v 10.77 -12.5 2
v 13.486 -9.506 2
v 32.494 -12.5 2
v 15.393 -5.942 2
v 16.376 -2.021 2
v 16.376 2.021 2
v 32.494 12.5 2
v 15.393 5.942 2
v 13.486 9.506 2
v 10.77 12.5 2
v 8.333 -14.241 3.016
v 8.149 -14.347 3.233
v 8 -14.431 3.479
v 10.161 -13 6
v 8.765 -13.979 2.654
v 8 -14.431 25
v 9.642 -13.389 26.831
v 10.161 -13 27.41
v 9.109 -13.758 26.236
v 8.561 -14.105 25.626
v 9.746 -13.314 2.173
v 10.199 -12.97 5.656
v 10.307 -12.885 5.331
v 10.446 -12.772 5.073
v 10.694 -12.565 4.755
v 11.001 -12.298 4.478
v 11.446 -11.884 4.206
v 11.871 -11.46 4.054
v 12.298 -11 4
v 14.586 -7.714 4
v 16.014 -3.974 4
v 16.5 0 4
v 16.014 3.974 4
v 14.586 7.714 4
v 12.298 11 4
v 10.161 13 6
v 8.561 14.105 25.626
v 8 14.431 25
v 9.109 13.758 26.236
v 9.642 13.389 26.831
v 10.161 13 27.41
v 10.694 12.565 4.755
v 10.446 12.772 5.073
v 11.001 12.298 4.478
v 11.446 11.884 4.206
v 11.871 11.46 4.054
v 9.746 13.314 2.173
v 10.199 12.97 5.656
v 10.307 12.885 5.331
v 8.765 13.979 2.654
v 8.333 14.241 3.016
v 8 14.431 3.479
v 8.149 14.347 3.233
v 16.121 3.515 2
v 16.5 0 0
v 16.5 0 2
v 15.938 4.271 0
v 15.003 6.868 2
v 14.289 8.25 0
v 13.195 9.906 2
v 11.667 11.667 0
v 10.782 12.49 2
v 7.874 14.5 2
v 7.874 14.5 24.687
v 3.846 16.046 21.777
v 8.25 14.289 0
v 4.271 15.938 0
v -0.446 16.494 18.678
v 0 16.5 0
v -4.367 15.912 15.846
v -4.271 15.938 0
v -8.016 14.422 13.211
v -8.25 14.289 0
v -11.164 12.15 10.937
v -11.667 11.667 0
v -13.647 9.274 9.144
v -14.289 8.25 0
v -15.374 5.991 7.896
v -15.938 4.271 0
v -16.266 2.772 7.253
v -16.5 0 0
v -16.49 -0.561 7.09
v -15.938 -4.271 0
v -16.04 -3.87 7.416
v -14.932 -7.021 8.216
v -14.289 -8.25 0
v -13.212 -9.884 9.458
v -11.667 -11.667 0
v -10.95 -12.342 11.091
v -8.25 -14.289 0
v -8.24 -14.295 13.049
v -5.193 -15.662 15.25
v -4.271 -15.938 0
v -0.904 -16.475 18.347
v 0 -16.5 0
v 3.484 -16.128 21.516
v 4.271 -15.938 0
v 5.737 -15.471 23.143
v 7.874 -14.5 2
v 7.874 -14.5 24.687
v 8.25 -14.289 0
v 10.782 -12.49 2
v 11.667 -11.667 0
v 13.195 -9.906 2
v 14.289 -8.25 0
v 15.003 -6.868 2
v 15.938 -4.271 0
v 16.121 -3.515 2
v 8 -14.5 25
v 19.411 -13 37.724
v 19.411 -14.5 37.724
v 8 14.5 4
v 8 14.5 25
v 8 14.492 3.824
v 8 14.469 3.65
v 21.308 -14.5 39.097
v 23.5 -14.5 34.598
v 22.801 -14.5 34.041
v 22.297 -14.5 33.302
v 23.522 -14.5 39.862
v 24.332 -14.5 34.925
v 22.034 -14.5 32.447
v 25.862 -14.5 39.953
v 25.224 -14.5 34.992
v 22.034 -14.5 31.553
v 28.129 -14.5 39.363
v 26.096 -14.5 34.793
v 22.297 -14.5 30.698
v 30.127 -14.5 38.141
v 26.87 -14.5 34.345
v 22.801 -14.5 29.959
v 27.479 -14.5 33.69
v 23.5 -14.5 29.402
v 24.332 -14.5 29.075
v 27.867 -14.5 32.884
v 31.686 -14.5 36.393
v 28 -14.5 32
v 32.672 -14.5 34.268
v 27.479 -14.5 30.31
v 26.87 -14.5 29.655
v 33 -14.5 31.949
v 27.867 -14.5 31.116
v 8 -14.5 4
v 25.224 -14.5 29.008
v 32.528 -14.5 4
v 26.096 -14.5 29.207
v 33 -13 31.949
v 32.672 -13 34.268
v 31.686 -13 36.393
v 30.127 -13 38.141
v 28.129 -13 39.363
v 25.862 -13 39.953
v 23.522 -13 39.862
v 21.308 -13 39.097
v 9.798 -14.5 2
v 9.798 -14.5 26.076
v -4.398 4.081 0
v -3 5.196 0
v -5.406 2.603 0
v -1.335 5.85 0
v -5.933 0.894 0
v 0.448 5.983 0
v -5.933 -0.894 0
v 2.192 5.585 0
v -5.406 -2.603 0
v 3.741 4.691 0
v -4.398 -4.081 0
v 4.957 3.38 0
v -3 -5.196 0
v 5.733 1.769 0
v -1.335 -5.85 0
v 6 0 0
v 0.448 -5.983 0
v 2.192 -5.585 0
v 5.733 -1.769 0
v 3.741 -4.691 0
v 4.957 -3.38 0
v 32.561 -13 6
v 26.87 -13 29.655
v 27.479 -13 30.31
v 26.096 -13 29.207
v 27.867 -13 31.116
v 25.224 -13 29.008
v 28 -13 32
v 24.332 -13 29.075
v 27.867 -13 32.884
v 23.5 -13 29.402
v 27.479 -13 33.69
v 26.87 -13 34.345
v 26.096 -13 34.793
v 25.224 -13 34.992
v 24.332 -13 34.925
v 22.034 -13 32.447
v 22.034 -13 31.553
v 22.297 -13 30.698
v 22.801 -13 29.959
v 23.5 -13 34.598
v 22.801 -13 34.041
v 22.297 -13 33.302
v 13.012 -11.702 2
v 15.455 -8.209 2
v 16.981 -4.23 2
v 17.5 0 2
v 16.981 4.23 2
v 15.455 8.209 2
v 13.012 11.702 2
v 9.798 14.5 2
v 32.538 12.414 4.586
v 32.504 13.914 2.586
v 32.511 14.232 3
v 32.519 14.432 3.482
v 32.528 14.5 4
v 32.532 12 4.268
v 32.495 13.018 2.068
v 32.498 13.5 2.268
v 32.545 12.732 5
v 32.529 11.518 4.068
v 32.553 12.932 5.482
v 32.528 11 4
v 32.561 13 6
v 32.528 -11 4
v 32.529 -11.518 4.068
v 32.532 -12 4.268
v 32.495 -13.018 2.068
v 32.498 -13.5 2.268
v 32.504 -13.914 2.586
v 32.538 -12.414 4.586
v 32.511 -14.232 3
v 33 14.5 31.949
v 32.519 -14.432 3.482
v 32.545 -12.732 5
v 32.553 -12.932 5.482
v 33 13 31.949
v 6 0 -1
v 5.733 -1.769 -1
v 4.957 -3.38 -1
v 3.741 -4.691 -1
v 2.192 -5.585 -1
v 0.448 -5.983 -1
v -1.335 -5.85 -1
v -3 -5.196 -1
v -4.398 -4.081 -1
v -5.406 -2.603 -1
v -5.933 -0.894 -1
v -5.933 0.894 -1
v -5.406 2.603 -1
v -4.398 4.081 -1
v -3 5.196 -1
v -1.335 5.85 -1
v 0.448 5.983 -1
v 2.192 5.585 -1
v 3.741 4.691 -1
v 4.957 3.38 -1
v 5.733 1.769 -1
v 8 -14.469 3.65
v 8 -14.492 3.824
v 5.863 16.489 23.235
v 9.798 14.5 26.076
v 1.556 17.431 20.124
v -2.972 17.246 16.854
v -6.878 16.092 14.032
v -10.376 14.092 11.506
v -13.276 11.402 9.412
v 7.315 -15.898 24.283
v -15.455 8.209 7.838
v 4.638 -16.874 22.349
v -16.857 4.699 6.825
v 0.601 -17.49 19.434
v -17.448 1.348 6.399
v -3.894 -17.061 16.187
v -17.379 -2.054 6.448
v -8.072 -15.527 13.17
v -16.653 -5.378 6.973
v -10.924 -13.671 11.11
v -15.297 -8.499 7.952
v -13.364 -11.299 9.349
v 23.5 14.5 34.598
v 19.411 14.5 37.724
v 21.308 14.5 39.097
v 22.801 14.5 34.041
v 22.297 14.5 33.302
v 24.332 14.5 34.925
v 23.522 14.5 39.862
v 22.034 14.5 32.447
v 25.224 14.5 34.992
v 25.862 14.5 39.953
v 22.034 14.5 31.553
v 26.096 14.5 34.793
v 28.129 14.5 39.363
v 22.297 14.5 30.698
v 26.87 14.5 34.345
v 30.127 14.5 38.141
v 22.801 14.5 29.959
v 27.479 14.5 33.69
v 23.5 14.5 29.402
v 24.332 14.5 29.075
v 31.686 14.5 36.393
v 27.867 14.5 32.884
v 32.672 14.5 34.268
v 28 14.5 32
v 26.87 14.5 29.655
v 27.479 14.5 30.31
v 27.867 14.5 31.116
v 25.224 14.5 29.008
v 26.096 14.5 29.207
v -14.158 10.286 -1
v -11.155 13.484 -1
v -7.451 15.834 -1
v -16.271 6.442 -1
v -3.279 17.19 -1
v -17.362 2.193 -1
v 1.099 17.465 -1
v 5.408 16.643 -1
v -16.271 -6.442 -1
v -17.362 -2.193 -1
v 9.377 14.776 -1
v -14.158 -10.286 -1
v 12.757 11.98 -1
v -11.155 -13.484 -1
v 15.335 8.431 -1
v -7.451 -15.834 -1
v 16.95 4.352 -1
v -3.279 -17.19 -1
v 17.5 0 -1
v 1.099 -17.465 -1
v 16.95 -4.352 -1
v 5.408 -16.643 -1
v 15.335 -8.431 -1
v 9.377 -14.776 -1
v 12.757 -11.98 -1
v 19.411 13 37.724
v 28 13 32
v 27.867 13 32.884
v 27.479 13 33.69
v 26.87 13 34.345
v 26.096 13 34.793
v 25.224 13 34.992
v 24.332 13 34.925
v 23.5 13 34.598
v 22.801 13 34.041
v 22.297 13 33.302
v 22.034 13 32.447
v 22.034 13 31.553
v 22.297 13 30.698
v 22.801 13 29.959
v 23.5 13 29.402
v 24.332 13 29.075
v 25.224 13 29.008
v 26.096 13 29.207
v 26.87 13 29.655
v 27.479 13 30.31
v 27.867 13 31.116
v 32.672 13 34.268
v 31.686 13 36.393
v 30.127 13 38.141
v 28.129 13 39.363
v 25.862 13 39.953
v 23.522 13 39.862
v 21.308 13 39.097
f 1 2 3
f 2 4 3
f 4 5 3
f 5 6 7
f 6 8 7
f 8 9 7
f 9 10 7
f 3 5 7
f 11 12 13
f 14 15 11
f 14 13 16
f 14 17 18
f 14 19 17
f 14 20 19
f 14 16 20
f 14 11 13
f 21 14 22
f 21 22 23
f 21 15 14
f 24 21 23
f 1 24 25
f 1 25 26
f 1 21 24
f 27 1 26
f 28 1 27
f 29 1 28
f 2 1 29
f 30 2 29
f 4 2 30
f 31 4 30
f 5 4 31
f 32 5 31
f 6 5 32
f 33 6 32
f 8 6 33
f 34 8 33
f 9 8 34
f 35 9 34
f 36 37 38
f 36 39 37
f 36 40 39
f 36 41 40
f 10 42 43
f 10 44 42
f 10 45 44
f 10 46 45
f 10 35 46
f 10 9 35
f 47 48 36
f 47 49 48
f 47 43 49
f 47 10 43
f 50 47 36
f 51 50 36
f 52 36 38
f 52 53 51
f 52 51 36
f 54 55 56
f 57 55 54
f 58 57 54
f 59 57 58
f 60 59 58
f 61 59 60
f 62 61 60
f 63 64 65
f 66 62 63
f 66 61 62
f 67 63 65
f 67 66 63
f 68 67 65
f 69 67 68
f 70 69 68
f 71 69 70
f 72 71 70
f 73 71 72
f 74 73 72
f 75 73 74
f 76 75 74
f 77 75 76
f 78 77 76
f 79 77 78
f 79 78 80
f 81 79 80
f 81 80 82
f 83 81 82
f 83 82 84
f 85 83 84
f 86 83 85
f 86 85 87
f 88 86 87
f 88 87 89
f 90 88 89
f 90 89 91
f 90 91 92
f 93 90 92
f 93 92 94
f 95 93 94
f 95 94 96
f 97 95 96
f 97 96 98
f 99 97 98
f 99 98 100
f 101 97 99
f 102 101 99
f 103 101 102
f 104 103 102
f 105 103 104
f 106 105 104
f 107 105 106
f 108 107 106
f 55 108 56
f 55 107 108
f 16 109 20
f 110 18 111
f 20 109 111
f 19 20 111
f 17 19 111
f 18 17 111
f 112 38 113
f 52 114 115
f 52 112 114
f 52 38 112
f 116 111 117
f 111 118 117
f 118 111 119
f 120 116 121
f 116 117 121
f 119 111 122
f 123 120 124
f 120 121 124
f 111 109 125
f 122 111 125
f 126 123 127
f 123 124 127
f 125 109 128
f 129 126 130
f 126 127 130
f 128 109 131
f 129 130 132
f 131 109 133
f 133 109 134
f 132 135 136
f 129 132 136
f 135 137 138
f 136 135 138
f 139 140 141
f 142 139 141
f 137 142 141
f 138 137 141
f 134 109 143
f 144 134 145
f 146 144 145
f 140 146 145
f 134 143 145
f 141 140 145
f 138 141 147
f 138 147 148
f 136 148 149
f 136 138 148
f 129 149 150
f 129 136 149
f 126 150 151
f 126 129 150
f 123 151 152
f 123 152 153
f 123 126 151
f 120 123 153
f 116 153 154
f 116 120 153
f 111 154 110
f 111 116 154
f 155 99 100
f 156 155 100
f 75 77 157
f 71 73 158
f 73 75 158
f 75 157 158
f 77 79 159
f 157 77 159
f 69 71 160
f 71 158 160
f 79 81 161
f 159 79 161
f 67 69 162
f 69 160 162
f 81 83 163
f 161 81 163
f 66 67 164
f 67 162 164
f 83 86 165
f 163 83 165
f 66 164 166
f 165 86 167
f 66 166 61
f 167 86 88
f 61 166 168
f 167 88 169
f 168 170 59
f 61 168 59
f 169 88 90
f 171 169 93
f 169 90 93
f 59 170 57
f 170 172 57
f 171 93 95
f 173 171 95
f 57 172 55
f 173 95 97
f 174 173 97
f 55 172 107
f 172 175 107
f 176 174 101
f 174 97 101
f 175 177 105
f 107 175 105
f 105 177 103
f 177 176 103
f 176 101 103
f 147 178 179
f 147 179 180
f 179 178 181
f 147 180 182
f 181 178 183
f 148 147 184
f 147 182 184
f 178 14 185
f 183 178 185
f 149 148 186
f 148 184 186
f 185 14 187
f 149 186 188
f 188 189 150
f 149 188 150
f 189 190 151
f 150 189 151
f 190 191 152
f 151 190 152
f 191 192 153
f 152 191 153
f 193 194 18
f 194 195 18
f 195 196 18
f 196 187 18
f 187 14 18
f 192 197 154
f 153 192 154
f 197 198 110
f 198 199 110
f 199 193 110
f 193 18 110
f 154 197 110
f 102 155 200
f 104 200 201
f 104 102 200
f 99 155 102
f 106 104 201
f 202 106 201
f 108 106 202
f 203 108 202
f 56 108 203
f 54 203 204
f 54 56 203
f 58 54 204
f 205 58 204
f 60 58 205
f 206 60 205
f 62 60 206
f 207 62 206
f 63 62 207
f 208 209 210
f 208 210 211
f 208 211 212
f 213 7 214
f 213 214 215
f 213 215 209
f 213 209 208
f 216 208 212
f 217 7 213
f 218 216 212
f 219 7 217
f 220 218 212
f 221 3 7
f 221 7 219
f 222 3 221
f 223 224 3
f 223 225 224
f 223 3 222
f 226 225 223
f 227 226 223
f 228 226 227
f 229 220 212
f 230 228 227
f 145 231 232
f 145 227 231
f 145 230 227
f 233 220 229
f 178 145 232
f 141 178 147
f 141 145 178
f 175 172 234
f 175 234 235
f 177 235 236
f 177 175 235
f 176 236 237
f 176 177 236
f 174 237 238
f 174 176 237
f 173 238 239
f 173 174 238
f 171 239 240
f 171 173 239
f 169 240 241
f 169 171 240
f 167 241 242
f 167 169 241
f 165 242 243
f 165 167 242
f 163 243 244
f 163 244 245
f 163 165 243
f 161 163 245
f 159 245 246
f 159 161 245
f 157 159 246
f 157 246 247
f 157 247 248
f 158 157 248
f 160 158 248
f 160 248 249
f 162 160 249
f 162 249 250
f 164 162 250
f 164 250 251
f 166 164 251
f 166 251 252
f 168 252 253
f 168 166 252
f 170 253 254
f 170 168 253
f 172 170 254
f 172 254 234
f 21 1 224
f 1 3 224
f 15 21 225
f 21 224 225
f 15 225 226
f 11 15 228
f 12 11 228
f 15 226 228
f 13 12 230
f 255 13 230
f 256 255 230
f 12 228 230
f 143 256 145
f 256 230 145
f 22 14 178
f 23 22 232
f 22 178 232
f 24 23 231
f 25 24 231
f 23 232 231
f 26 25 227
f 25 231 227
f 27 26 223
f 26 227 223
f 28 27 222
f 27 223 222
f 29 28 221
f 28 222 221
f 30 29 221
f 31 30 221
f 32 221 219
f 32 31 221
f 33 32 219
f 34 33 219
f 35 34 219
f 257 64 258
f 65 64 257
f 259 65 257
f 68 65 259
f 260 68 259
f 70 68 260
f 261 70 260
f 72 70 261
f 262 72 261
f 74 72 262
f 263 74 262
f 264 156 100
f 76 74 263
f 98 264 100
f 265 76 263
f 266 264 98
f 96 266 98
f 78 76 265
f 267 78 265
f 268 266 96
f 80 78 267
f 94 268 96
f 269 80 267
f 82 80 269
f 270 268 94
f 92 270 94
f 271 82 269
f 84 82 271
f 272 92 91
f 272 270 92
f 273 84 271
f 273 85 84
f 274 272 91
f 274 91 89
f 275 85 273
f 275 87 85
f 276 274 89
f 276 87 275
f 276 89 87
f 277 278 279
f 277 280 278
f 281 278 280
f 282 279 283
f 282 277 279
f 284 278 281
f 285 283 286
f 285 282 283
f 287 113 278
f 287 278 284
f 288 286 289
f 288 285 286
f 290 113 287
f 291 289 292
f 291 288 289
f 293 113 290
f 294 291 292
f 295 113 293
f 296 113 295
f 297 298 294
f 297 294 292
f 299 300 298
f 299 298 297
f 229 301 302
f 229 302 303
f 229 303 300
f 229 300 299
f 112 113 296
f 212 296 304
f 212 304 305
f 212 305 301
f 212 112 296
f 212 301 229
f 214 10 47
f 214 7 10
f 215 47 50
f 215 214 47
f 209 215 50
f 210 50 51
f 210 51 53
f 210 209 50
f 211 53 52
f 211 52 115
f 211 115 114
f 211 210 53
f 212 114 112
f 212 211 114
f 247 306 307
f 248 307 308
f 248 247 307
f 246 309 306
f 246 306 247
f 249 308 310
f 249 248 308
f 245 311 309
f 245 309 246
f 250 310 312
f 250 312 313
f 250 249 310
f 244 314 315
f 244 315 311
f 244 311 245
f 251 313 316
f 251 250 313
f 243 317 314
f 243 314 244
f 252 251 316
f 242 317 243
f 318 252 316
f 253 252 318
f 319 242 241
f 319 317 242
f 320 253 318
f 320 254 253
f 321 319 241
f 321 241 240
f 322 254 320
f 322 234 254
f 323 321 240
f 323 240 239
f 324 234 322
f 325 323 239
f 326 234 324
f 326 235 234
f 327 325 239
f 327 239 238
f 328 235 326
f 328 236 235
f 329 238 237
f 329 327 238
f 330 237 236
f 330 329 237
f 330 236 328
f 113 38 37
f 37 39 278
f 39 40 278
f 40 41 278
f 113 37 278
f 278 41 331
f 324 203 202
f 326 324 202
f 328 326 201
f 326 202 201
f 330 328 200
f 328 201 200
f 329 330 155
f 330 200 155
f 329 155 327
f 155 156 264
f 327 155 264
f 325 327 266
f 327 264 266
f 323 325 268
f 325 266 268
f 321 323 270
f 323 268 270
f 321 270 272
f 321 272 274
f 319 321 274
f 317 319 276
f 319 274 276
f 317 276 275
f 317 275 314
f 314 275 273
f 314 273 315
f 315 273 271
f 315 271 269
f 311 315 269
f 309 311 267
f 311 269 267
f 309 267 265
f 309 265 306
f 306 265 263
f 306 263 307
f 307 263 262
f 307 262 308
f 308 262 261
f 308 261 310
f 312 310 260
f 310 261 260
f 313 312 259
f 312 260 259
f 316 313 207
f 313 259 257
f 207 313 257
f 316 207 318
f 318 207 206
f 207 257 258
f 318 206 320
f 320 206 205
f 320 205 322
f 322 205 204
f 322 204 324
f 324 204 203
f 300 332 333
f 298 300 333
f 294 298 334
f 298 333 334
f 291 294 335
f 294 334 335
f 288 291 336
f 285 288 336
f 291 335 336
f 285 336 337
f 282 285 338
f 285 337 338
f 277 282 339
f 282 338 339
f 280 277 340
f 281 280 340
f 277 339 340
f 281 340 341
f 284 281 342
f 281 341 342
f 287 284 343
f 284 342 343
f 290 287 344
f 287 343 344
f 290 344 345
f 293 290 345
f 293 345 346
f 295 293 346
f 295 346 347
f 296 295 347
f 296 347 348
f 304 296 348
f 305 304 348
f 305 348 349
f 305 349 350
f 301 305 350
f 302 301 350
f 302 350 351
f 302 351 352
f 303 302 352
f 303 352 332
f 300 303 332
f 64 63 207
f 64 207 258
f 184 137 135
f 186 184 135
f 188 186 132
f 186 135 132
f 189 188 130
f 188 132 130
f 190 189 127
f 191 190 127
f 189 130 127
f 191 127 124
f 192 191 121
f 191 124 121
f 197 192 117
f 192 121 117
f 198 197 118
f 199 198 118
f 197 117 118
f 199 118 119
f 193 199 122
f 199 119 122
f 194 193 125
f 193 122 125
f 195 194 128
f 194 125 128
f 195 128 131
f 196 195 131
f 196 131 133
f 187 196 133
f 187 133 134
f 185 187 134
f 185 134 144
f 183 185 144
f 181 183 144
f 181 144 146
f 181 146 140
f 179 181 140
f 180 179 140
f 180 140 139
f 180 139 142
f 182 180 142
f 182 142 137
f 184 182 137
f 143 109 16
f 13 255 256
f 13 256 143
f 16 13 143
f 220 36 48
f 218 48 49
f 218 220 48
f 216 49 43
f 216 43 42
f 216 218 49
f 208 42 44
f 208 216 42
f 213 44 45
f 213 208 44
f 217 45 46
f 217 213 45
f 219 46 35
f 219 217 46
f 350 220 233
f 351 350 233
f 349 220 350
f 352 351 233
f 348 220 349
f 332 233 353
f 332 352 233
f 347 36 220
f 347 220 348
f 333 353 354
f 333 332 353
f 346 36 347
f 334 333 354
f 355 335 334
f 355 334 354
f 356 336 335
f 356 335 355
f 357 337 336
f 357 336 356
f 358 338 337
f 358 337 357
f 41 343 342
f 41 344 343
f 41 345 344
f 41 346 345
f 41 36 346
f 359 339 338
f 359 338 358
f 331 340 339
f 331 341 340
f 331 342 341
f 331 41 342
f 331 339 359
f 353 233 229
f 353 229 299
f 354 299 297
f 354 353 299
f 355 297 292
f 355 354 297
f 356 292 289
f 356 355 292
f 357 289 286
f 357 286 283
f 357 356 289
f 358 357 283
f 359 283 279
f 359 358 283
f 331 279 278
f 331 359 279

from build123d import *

# Parameters (mm, degrees)
SKETCH004_W     = 29
SKETCH004_H     = 32
PAD003_DEPTH    = 18
PAD002_DEPTH    = 18
SKETCH_R        = 17.5
SKETCH_R_2      = 16.5
PAD_DEPTH       = 32
SKETCH001_R     = 17.5
SKETCH001_R_2   = 6
PAD001_DEPTH    = 1
SKETCH005_W     = 26
SKETCH005_H     = 29
PAD004_DEPTH    = 39
BOX_W           = 26
BOX_H           = 50
BOX_DEPTH       = 30
CYLINDER_R      = 16.5
CYLINDER_DEPTH  = 42
SKETCH007_R     = 3
POCKET_DEPTH    = 30
POCKET001_DEPTH = 30
FILLET_R        = 2


with BuildPart() as body002:
    # Sketch004 → Pad003 (new body)
    with BuildSketch(Plane.YZ):
        with Locations((0, 18)):
            Rectangle(SKETCH004_W, SKETCH004_H)
    extrude(amount=PAD003_DEPTH)


with BuildPart() as body001:
    # Sketch003 → Pad002 (new body, symmetric)
    with BuildSketch(Plane.XZ):
        Polygon((-28, 32), (18, 32), (-18, 6), (-18, 0), (-28, 0), align=None)
    extrude(amount=PAD002_DEPTH, both=True)


with BuildPart() as cut001:
    # Sketch → Pad (new body)
    with BuildSketch(Plane.XY):
        Circle(SKETCH_R)
        Circle(SKETCH_R_2, mode=Mode.SUBTRACT)
    extrude(amount=PAD_DEPTH)

    # Sketch001 (on Face3 of Pad) → Pad001 (join)
    with BuildSketch(Plane(origin=(0, 0, 0), x_dir=(1, 0, 0), z_dir=(0, 0, -1))):
        Circle(SKETCH001_R)
        Circle(SKETCH001_R_2, mode=Mode.SUBTRACT)
    extrude(amount=PAD001_DEPTH)

    # Cut: cut Body001
    add(body001.part, mode=Mode.SUBTRACT)

    # Cut001: cut Body002
    add(body002.part, mode=Mode.SUBTRACT)


with BuildPart() as body003:
    # Sketch005 → Pad004 (new body)
    with BuildSketch(Plane.XY.offset(2)):
        with Locations((21, 0)):
            Rectangle(SKETCH005_W, SKETCH005_H)
    extrude(amount=PAD004_DEPTH)

    # Box → Box (cut)
    with BuildSketch(Plane(origin=(5, -13, 4), x_dir=(0, 1, 0), z_dir=(1, 0, 0))):
        with Locations((13, 25)):
            Rectangle(BOX_W, BOX_H)
    extrude(amount=BOX_DEPTH, mode=Mode.SUBTRACT)

    # Cylinder → Cylinder (cut)
    with BuildSketch(Plane.XY):
        Circle(CYLINDER_R)
    extrude(amount=CYLINDER_DEPTH, mode=Mode.SUBTRACT)

    # Sketch007 (on Face7 of Cylinder) → Pocket (cut)
    with BuildSketch(Plane.XZ.offset(14.5)):
        with Locations((25, 32)):
            Circle(SKETCH007_R)
    extrude(amount=-POCKET_DEPTH, mode=Mode.SUBTRACT)

    # Sketch008 (on Face10 of Pocket) → Pocket001 (cut)
    with BuildSketch(Plane.XZ.offset(14.5)):
        with BuildLine():
            Line((32.482746, 1.344281), (32.999839, 31.949261))
            ThreePointArc((32.999839, 31.949261), (28.128782, 39.362793), (19.410904, 37.72381))
            Line((8, 25), (19.410904, 37.72381))
            Line((8, 25), (8, 43.812584))
            Line((8, 43.812584), (37.606125, 43.812584))
            Line((37.606125, 43.812584), (37.606125, 1.344281))
            Line((37.606125, 1.344281), (32.482746, 1.344281))
        make_face()
    extrude(amount=-POCKET001_DEPTH, mode=Mode.SUBTRACT)

    # Fillet
    fillet_edges = [body003.edges().sort_by_distance(p)[0] for p in [
        (20.246912, -14.5, 2),
        (21.344408, -13, 4),
        (21.344408, 13, 4),
        (20.246912, 14.5, 2),
    ]]
    fillet(fillet_edges, radius=FILLET_R)


solid = Compound([cut001.part, body003.part])
